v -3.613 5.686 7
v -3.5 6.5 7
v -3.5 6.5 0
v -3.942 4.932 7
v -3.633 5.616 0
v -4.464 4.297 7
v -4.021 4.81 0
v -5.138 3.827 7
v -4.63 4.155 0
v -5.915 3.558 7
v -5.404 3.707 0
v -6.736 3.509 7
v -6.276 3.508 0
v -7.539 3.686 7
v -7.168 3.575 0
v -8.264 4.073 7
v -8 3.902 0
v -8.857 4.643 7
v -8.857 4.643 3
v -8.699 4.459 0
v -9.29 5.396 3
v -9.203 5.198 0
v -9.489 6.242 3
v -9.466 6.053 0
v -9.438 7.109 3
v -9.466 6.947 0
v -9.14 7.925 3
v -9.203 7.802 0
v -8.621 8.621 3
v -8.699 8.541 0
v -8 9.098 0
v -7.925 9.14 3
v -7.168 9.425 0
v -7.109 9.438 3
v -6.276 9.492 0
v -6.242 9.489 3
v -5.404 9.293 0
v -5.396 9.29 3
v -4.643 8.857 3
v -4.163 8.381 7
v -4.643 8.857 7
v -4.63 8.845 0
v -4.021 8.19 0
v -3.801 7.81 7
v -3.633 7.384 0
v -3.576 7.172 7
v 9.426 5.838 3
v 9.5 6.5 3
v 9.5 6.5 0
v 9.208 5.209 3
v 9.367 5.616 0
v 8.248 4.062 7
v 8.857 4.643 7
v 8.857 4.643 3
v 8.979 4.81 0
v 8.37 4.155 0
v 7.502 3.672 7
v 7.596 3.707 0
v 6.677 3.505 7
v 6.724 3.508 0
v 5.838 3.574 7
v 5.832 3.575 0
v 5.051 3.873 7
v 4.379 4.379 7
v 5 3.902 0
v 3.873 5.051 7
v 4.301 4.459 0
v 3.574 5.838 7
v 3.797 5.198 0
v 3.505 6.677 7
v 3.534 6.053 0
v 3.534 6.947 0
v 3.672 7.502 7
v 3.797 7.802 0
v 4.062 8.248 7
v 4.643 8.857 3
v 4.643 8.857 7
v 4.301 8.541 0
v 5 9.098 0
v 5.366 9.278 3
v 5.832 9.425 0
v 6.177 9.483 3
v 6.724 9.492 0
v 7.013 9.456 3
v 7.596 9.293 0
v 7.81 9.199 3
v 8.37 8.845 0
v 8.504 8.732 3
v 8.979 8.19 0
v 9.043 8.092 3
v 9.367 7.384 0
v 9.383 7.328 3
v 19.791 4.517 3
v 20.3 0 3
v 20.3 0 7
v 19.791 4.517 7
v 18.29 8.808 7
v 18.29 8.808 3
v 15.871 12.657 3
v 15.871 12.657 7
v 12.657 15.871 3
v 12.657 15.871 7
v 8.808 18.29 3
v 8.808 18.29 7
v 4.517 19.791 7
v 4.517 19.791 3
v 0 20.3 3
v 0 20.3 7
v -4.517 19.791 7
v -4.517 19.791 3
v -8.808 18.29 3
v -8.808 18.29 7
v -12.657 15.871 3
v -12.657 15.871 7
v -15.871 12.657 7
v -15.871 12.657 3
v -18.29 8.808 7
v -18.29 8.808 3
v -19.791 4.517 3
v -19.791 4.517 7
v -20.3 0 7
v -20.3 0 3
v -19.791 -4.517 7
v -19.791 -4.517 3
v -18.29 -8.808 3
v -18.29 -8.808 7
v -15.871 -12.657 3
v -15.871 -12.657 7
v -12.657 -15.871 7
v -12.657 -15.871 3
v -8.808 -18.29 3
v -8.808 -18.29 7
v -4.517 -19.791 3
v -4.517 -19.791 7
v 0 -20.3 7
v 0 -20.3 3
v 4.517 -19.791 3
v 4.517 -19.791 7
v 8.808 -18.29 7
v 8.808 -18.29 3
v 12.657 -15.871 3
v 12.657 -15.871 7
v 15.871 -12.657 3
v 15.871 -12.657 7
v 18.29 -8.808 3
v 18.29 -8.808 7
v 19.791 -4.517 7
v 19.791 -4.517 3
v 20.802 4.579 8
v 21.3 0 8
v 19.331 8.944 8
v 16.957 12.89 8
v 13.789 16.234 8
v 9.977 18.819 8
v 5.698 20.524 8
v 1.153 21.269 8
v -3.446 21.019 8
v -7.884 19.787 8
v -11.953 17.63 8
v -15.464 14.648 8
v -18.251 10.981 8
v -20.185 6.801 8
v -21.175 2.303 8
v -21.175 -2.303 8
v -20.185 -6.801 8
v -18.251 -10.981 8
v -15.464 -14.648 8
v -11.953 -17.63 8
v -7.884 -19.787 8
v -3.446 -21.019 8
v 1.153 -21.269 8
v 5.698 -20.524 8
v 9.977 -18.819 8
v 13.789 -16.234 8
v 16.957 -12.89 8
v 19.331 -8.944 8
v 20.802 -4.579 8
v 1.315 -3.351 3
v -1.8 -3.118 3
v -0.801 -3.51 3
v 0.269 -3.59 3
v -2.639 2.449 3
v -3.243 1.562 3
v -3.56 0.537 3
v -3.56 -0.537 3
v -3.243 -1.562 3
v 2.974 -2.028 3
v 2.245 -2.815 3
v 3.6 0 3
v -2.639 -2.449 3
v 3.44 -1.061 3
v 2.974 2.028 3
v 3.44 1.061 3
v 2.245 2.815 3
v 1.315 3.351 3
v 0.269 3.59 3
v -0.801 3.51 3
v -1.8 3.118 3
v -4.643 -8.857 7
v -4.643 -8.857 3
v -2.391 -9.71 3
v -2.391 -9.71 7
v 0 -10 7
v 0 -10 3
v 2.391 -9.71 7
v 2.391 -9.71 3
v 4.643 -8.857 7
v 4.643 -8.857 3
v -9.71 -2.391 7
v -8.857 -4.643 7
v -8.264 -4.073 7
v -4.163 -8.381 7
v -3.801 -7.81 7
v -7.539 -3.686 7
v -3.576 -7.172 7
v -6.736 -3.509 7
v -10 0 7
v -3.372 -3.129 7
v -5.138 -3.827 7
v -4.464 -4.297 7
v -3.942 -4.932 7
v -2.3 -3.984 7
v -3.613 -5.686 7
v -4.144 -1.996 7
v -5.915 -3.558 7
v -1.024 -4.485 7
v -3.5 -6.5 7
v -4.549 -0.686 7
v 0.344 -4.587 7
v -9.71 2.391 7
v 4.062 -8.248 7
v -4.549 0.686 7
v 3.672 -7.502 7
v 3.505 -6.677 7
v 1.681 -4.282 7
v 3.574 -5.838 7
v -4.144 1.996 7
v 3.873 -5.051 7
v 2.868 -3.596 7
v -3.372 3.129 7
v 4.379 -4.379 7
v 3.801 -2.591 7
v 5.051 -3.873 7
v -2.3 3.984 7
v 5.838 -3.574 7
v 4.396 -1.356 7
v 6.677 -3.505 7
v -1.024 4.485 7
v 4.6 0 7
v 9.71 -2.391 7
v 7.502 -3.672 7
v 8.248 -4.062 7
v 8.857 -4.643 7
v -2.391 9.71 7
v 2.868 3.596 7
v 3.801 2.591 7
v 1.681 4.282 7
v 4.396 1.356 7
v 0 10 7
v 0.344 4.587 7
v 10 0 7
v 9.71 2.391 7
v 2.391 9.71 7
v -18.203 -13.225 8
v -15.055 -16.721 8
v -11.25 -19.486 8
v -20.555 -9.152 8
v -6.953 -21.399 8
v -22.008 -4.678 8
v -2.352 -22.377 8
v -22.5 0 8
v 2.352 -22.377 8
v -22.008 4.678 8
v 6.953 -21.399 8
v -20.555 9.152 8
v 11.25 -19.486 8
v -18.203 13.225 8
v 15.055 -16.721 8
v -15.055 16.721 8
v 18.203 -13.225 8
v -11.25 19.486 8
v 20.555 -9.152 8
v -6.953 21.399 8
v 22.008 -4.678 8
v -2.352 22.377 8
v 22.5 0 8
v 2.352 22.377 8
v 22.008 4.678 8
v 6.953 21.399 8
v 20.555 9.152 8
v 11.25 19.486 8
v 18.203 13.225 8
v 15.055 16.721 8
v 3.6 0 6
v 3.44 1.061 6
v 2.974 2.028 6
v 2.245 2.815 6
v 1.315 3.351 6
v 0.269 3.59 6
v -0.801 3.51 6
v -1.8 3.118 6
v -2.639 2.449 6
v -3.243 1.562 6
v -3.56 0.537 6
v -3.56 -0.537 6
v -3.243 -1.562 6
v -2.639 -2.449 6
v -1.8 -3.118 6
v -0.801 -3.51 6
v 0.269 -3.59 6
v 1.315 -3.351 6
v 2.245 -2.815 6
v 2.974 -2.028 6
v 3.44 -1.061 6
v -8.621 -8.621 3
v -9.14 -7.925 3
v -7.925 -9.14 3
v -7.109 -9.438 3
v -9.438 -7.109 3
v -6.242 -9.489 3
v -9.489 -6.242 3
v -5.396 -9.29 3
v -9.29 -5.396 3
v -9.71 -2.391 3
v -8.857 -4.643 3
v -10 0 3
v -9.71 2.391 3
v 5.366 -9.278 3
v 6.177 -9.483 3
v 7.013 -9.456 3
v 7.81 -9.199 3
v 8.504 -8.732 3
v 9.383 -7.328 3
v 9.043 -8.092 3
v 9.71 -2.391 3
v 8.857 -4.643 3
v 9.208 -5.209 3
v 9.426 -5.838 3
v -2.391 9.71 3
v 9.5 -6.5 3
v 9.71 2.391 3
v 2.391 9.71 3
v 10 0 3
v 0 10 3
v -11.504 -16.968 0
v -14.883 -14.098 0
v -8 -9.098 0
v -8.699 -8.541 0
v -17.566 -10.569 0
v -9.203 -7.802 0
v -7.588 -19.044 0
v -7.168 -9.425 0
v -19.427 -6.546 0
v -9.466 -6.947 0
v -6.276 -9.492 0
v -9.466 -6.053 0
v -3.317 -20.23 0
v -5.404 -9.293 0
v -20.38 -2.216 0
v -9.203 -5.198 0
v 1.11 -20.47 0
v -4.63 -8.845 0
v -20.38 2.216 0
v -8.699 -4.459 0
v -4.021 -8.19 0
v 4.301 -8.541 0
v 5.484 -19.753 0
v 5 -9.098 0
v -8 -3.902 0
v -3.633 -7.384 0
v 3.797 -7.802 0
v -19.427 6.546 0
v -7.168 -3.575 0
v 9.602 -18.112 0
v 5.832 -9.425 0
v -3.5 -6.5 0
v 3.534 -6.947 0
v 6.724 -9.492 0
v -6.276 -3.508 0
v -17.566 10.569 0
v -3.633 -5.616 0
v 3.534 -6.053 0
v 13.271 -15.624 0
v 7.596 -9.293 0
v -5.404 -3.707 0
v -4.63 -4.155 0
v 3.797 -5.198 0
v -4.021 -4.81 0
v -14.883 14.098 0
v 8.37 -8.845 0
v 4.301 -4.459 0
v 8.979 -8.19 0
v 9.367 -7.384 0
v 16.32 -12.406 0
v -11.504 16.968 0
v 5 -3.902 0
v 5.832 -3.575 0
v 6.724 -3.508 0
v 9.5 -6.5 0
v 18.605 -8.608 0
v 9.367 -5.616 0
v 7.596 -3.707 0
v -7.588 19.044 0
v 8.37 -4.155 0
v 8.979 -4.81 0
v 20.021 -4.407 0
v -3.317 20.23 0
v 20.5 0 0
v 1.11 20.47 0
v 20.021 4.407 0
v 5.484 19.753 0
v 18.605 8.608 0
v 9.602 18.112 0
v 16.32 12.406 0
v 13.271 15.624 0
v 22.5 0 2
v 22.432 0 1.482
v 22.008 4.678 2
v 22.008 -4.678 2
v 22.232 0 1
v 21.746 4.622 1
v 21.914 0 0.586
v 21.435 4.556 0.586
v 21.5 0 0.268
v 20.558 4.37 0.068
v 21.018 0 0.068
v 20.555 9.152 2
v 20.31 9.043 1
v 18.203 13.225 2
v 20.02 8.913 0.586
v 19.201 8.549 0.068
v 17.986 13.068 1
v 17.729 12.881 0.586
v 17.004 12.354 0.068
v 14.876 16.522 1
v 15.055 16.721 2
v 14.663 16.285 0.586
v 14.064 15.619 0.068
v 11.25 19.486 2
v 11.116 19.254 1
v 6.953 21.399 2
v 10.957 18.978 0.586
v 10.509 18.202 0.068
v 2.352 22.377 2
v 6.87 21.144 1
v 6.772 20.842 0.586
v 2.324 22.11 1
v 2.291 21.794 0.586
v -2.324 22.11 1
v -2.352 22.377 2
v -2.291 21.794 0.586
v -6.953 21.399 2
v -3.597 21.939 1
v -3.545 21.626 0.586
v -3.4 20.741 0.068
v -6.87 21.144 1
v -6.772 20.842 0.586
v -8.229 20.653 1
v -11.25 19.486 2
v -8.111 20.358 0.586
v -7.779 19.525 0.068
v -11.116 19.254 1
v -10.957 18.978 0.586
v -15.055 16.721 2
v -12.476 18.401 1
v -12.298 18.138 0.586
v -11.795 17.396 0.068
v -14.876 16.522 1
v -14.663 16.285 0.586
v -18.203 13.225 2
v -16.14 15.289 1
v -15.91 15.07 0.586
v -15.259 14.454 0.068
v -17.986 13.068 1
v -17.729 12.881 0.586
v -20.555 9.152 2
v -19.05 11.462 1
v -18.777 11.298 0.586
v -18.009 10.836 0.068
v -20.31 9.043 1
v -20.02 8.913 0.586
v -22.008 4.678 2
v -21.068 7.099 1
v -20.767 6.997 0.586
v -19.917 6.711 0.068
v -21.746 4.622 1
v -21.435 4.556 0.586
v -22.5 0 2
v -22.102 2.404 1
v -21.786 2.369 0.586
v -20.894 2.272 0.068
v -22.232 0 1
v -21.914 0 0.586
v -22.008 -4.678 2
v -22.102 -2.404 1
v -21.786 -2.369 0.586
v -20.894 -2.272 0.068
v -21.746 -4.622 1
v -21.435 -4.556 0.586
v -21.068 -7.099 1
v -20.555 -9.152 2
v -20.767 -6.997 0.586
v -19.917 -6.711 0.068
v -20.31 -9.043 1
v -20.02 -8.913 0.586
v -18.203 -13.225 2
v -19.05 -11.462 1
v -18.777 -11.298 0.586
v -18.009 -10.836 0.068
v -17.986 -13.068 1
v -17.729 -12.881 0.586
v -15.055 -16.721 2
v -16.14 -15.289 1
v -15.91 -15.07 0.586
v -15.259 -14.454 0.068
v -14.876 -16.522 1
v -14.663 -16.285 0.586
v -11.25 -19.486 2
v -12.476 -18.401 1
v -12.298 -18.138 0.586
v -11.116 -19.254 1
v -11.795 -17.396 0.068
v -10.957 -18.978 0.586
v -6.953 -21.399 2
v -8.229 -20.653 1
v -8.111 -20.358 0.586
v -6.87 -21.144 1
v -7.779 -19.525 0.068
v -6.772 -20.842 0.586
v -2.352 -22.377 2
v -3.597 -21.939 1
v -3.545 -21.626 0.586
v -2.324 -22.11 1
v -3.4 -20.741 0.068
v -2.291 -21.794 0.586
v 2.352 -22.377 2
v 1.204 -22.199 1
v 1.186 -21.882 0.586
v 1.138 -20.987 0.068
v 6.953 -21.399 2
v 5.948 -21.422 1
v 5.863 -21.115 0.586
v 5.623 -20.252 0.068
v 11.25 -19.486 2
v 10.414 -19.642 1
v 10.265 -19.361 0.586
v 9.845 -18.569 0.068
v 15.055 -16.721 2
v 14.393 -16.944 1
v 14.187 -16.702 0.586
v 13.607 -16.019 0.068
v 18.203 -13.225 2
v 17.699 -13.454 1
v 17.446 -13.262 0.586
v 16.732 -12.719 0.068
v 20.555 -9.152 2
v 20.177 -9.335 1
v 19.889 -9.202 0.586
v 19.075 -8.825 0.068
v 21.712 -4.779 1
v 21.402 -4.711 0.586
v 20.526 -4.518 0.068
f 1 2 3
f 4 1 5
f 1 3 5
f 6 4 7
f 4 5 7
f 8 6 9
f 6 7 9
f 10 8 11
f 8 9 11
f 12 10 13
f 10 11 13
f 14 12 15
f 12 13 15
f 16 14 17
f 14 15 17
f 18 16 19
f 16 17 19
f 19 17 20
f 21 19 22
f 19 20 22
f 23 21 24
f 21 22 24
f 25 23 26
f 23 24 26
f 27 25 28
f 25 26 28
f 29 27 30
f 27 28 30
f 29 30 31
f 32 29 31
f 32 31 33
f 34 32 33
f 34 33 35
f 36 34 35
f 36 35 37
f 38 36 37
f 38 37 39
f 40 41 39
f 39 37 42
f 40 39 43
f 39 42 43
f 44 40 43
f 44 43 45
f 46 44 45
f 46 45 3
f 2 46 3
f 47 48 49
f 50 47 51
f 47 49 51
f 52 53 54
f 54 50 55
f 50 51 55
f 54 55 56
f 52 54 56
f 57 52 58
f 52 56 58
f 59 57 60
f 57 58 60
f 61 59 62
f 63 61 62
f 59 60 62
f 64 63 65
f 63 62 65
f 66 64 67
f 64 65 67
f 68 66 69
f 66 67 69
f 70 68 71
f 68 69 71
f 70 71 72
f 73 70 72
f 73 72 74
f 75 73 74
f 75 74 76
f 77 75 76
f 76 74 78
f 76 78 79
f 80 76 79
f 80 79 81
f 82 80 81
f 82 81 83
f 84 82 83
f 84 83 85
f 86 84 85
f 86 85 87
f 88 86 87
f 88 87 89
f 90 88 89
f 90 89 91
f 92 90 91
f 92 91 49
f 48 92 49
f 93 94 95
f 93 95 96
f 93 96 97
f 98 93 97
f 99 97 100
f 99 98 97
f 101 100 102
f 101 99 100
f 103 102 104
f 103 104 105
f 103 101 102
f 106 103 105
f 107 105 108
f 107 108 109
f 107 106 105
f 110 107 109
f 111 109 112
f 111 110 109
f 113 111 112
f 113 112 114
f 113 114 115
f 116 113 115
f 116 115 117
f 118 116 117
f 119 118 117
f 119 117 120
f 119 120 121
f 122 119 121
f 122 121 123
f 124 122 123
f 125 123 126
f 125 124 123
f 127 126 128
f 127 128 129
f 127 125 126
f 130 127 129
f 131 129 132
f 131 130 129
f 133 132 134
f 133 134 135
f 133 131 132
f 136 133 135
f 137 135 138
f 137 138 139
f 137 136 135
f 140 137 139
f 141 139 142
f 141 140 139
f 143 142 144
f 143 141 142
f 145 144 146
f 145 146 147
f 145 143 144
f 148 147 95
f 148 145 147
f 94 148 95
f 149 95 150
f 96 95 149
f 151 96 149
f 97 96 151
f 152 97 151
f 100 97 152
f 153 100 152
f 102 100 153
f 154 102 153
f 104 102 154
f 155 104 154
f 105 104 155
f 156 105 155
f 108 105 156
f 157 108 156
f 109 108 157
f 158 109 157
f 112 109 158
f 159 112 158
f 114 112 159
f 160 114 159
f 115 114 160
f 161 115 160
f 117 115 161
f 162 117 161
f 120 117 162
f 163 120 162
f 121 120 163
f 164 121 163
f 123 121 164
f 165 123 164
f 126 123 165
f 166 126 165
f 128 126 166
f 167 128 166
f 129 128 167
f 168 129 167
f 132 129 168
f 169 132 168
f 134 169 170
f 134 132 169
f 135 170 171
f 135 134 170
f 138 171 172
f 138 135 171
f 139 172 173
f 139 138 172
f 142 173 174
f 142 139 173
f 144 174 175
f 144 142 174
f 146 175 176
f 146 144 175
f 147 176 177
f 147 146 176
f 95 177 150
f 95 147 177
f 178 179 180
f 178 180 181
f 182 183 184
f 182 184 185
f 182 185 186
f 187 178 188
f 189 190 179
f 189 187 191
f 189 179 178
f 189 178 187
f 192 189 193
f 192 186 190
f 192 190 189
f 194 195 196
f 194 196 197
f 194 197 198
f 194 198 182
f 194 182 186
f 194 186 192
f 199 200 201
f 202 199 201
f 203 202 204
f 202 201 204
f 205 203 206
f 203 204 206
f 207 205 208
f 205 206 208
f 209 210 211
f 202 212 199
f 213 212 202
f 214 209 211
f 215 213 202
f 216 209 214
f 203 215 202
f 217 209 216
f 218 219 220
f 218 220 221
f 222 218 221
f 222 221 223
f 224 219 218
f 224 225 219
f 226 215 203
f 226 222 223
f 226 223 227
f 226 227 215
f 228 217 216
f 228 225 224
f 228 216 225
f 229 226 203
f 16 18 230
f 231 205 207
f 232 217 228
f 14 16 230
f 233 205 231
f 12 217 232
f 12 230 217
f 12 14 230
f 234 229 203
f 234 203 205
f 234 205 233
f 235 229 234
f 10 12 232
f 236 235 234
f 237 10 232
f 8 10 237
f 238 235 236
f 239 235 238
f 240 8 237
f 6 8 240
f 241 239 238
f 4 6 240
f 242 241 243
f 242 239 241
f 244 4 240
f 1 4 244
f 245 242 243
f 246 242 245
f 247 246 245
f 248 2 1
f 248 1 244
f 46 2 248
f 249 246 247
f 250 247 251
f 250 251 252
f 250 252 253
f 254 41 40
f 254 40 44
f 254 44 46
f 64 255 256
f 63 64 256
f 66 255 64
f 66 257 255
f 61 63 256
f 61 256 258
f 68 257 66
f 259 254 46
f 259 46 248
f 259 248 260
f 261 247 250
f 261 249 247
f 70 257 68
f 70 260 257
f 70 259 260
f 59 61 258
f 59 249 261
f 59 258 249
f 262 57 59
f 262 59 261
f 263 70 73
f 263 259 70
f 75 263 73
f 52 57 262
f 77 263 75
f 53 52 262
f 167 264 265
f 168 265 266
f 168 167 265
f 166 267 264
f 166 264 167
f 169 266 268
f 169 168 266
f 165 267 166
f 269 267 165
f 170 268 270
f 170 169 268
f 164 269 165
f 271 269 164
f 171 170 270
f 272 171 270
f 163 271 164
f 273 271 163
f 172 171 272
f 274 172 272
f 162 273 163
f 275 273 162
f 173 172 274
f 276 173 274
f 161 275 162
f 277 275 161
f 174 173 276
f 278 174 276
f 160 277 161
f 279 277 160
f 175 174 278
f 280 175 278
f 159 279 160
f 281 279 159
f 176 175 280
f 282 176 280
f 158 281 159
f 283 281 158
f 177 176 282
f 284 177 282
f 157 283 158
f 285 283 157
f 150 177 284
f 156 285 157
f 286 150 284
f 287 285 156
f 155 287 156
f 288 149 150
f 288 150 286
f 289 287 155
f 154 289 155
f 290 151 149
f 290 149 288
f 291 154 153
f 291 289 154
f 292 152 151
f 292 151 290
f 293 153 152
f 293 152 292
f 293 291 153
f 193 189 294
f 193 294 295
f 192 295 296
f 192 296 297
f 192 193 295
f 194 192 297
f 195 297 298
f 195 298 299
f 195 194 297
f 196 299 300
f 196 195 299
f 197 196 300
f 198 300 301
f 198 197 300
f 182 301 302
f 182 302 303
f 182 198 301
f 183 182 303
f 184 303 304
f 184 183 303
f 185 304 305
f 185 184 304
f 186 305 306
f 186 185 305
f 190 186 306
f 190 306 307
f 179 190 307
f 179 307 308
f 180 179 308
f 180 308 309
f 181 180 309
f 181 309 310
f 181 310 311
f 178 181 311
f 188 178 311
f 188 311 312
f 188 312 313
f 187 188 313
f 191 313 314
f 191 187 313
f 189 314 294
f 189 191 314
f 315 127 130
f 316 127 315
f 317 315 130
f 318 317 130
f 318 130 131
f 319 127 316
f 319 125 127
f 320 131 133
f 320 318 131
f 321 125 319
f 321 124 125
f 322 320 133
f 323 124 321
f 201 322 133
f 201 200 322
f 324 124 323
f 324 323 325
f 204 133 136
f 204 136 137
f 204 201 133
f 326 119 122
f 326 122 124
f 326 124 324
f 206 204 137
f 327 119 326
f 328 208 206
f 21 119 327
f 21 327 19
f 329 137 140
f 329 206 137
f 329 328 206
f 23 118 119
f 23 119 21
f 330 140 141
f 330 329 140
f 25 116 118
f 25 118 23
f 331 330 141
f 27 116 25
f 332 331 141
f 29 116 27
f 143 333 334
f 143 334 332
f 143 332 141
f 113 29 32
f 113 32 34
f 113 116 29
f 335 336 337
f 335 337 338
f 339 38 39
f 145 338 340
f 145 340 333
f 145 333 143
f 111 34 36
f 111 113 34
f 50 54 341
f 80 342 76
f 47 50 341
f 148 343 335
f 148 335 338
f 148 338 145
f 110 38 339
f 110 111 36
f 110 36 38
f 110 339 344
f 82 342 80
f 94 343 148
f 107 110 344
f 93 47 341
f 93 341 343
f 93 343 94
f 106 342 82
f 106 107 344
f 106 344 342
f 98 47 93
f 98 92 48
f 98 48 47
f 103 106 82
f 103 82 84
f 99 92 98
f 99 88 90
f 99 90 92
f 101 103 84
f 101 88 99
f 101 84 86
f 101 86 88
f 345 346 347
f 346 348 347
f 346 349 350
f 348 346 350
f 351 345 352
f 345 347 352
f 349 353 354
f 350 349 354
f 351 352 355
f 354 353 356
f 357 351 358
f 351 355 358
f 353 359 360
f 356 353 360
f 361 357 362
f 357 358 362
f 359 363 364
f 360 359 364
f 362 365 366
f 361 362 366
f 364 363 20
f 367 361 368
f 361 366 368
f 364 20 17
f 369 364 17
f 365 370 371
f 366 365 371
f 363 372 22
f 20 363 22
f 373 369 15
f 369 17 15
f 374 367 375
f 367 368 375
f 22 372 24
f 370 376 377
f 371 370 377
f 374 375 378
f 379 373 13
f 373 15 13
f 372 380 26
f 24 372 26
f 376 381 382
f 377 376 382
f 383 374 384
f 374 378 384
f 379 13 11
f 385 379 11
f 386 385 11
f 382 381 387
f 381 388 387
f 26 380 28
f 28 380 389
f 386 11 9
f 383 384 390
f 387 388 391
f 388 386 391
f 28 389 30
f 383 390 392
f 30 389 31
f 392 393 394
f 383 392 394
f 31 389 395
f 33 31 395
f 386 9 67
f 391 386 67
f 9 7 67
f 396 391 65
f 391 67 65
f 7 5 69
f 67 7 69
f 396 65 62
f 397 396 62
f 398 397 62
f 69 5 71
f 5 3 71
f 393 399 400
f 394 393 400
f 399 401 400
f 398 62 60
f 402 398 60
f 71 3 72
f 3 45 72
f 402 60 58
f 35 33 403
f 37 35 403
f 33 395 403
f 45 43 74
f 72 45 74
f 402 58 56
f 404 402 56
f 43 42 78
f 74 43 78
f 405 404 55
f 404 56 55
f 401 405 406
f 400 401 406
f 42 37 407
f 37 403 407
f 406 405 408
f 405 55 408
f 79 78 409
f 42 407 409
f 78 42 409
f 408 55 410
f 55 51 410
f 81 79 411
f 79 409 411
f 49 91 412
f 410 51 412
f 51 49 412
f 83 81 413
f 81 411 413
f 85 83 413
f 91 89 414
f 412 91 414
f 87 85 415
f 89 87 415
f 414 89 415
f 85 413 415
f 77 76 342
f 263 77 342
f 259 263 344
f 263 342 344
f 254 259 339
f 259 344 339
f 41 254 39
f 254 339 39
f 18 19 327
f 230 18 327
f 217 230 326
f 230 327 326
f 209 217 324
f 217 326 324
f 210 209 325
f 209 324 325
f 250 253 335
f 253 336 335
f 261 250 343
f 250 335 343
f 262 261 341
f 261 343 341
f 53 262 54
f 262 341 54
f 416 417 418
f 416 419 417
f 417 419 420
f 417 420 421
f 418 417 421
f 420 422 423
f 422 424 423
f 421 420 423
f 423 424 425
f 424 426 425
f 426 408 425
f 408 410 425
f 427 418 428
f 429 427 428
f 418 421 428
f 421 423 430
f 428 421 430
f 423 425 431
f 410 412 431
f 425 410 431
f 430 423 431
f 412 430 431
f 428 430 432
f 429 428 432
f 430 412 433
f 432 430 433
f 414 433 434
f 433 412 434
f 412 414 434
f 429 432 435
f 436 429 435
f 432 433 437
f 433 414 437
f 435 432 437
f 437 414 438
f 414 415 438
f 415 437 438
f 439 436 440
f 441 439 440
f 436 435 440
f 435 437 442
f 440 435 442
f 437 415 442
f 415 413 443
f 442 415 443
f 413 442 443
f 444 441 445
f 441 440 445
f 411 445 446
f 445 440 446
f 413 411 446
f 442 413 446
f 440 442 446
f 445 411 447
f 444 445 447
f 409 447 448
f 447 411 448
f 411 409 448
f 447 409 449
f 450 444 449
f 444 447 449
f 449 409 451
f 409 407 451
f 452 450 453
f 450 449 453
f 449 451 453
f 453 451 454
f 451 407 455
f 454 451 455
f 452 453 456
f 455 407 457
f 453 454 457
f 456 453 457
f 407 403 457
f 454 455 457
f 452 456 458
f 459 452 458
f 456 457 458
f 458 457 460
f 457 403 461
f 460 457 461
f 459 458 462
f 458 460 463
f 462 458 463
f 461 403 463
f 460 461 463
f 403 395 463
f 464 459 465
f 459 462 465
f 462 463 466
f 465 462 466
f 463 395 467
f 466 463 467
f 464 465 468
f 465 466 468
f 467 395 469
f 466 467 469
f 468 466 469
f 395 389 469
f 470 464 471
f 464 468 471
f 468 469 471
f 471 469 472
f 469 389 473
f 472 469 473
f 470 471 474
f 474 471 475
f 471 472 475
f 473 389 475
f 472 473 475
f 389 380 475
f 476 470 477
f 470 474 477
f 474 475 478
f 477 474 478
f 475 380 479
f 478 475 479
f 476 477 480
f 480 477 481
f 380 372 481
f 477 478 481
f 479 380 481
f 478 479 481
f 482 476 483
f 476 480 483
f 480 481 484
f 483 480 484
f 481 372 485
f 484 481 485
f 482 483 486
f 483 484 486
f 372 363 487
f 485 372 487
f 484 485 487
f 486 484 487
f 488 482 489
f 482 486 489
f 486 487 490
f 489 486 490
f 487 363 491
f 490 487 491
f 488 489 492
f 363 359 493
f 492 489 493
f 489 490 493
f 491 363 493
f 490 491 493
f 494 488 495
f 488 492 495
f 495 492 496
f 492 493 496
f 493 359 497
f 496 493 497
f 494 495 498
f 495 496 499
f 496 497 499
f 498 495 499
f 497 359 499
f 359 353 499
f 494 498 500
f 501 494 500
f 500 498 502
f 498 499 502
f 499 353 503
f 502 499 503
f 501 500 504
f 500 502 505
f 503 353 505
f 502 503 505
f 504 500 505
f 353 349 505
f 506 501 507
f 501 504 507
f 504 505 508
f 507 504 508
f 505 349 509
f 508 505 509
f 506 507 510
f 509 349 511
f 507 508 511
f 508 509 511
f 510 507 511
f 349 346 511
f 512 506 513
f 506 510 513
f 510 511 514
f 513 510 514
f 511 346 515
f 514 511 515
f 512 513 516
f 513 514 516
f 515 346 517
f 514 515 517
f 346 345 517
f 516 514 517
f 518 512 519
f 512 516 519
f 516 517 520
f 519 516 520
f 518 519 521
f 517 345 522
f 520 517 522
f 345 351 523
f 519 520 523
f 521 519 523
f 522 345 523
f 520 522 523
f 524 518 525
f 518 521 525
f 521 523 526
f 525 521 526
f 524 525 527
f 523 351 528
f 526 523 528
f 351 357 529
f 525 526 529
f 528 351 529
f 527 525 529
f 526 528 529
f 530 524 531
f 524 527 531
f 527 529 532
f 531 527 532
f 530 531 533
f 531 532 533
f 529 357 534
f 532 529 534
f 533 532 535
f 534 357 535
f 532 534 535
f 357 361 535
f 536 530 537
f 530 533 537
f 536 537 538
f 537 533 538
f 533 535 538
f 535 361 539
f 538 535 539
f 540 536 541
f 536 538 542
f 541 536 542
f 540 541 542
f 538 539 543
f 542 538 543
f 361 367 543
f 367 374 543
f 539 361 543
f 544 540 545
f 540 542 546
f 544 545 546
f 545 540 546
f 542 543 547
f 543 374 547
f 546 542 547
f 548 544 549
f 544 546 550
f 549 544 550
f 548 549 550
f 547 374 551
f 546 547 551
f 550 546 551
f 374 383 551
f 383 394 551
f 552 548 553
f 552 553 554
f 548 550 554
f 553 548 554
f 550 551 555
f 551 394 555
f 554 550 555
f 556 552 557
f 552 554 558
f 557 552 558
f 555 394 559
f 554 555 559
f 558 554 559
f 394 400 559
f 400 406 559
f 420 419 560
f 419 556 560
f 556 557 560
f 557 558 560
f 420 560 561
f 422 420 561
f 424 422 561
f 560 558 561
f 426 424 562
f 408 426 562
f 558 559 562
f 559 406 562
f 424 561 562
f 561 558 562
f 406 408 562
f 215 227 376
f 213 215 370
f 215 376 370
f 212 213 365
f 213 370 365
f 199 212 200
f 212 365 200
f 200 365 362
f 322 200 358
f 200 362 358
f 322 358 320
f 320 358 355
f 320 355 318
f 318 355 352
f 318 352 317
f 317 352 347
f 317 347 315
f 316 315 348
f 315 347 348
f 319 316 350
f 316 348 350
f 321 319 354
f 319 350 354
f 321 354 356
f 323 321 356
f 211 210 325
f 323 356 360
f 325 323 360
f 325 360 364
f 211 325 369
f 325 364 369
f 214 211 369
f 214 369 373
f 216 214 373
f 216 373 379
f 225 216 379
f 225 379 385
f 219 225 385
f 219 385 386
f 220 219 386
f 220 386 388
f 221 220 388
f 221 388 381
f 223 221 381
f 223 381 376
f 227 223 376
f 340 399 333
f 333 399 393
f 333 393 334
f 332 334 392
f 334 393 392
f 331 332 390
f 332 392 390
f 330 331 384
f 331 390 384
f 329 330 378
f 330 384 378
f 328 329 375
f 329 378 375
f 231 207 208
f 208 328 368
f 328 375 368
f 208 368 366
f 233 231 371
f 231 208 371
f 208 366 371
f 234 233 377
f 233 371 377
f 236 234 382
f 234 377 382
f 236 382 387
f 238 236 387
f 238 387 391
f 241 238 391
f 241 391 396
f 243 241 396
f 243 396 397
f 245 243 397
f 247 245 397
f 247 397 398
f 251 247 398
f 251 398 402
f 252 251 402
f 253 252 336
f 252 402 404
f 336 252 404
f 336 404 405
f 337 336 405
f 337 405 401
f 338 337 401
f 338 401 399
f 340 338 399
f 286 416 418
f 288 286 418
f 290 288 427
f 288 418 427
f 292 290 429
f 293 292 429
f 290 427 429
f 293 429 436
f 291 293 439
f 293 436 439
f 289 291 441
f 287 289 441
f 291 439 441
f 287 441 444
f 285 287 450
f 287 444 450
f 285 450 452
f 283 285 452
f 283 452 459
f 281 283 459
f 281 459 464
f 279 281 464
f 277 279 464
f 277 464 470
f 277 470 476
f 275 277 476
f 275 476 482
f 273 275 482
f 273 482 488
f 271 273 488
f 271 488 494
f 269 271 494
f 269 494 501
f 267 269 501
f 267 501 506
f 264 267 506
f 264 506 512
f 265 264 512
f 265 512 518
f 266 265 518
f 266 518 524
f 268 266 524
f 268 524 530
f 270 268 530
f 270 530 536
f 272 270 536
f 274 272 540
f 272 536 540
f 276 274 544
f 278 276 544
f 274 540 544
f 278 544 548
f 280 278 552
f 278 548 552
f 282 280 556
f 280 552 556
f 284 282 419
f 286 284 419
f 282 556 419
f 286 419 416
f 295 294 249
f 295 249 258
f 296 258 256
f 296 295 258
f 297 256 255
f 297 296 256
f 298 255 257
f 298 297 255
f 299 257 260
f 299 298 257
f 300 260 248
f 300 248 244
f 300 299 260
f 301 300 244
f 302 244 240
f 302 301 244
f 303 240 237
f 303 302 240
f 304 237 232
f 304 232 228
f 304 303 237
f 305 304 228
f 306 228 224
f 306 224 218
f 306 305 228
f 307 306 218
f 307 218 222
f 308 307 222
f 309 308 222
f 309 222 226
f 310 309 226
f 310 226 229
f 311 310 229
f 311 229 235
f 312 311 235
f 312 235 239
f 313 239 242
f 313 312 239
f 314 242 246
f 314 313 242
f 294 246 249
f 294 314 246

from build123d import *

# Parameters (mm, degrees)
SKETCH_R        = 22.5
PAD_DEPTH       = 3
SKETCH001_R     = 22.5
SKETCH001_R_2   = 20.3
PAD001_DEPTH    = 5
SKETCH002_R     = 10
SKETCH002_R_2   = 3.6
PAD002_DEPTH    = 4
SKETCH003_R     = 3
POCKET_DEPTH    = 8.001
FILLET_R        = 2
CHAMFER_SIZE    = 1
CHAMFER001_SIZE = 1


with BuildPart() as part:
    # Sketch → Pad (new body)
    with BuildSketch(Plane.XY):
        Circle(SKETCH_R)
    extrude(amount=PAD_DEPTH)

    # Sketch001 (on Face3 of Pad) → Pad001 (join)
    with BuildSketch(Plane.XY.offset(3)):
        Circle(SKETCH001_R)
        Circle(SKETCH001_R_2, mode=Mode.SUBTRACT)
    extrude(amount=PAD001_DEPTH)

    # Sketch002 (on Face5 of Pad001) → Pad002 (join)
    with BuildSketch(Plane.XY.offset(3)):
        Circle(SKETCH002_R)
        Circle(SKETCH002_R_2, mode=Mode.SUBTRACT)
    extrude(amount=PAD002_DEPTH)

    # Sketch003 (on Face1 of Pad002) → Pocket (cut, through all)
    with BuildSketch(Plane(origin=(0, 0, 0), x_dir=(1, 0, 0), z_dir=(0, 0, -1))):
        with Locations((-6.5, 6.5)):
            Circle(SKETCH003_R)
        with Locations((-6.5, -6.5)):
            Circle(SKETCH003_R)
        with Locations((6.5, -6.5)):
            Circle(SKETCH003_R)
        with Locations((6.5, 6.5)):
            Circle(SKETCH003_R)
    extrude(amount=-POCKET_DEPTH, mode=Mode.SUBTRACT)

    # Fillet
    fillet_edges = [part.edges().sort_by_distance(p)[0] for p in [
        (-22.5, 0, 0),
    ]]
    fillet(fillet_edges, radius=FILLET_R)

    # Chamfer
    chamfer_edges = [part.edges().sort_by_distance(p)[0] for p in [
        (-20.3, 0, 8),
    ]]
    chamfer(chamfer_edges, length=CHAMFER_SIZE)

    # Chamfer001
    chamfer001_edges = [part.edges().sort_by_distance(p)[0] for p in [
        (-3.6, 0, 7),
    ]]
    chamfer(chamfer001_edges, length=CHAMFER001_SIZE)


solid = part.part
